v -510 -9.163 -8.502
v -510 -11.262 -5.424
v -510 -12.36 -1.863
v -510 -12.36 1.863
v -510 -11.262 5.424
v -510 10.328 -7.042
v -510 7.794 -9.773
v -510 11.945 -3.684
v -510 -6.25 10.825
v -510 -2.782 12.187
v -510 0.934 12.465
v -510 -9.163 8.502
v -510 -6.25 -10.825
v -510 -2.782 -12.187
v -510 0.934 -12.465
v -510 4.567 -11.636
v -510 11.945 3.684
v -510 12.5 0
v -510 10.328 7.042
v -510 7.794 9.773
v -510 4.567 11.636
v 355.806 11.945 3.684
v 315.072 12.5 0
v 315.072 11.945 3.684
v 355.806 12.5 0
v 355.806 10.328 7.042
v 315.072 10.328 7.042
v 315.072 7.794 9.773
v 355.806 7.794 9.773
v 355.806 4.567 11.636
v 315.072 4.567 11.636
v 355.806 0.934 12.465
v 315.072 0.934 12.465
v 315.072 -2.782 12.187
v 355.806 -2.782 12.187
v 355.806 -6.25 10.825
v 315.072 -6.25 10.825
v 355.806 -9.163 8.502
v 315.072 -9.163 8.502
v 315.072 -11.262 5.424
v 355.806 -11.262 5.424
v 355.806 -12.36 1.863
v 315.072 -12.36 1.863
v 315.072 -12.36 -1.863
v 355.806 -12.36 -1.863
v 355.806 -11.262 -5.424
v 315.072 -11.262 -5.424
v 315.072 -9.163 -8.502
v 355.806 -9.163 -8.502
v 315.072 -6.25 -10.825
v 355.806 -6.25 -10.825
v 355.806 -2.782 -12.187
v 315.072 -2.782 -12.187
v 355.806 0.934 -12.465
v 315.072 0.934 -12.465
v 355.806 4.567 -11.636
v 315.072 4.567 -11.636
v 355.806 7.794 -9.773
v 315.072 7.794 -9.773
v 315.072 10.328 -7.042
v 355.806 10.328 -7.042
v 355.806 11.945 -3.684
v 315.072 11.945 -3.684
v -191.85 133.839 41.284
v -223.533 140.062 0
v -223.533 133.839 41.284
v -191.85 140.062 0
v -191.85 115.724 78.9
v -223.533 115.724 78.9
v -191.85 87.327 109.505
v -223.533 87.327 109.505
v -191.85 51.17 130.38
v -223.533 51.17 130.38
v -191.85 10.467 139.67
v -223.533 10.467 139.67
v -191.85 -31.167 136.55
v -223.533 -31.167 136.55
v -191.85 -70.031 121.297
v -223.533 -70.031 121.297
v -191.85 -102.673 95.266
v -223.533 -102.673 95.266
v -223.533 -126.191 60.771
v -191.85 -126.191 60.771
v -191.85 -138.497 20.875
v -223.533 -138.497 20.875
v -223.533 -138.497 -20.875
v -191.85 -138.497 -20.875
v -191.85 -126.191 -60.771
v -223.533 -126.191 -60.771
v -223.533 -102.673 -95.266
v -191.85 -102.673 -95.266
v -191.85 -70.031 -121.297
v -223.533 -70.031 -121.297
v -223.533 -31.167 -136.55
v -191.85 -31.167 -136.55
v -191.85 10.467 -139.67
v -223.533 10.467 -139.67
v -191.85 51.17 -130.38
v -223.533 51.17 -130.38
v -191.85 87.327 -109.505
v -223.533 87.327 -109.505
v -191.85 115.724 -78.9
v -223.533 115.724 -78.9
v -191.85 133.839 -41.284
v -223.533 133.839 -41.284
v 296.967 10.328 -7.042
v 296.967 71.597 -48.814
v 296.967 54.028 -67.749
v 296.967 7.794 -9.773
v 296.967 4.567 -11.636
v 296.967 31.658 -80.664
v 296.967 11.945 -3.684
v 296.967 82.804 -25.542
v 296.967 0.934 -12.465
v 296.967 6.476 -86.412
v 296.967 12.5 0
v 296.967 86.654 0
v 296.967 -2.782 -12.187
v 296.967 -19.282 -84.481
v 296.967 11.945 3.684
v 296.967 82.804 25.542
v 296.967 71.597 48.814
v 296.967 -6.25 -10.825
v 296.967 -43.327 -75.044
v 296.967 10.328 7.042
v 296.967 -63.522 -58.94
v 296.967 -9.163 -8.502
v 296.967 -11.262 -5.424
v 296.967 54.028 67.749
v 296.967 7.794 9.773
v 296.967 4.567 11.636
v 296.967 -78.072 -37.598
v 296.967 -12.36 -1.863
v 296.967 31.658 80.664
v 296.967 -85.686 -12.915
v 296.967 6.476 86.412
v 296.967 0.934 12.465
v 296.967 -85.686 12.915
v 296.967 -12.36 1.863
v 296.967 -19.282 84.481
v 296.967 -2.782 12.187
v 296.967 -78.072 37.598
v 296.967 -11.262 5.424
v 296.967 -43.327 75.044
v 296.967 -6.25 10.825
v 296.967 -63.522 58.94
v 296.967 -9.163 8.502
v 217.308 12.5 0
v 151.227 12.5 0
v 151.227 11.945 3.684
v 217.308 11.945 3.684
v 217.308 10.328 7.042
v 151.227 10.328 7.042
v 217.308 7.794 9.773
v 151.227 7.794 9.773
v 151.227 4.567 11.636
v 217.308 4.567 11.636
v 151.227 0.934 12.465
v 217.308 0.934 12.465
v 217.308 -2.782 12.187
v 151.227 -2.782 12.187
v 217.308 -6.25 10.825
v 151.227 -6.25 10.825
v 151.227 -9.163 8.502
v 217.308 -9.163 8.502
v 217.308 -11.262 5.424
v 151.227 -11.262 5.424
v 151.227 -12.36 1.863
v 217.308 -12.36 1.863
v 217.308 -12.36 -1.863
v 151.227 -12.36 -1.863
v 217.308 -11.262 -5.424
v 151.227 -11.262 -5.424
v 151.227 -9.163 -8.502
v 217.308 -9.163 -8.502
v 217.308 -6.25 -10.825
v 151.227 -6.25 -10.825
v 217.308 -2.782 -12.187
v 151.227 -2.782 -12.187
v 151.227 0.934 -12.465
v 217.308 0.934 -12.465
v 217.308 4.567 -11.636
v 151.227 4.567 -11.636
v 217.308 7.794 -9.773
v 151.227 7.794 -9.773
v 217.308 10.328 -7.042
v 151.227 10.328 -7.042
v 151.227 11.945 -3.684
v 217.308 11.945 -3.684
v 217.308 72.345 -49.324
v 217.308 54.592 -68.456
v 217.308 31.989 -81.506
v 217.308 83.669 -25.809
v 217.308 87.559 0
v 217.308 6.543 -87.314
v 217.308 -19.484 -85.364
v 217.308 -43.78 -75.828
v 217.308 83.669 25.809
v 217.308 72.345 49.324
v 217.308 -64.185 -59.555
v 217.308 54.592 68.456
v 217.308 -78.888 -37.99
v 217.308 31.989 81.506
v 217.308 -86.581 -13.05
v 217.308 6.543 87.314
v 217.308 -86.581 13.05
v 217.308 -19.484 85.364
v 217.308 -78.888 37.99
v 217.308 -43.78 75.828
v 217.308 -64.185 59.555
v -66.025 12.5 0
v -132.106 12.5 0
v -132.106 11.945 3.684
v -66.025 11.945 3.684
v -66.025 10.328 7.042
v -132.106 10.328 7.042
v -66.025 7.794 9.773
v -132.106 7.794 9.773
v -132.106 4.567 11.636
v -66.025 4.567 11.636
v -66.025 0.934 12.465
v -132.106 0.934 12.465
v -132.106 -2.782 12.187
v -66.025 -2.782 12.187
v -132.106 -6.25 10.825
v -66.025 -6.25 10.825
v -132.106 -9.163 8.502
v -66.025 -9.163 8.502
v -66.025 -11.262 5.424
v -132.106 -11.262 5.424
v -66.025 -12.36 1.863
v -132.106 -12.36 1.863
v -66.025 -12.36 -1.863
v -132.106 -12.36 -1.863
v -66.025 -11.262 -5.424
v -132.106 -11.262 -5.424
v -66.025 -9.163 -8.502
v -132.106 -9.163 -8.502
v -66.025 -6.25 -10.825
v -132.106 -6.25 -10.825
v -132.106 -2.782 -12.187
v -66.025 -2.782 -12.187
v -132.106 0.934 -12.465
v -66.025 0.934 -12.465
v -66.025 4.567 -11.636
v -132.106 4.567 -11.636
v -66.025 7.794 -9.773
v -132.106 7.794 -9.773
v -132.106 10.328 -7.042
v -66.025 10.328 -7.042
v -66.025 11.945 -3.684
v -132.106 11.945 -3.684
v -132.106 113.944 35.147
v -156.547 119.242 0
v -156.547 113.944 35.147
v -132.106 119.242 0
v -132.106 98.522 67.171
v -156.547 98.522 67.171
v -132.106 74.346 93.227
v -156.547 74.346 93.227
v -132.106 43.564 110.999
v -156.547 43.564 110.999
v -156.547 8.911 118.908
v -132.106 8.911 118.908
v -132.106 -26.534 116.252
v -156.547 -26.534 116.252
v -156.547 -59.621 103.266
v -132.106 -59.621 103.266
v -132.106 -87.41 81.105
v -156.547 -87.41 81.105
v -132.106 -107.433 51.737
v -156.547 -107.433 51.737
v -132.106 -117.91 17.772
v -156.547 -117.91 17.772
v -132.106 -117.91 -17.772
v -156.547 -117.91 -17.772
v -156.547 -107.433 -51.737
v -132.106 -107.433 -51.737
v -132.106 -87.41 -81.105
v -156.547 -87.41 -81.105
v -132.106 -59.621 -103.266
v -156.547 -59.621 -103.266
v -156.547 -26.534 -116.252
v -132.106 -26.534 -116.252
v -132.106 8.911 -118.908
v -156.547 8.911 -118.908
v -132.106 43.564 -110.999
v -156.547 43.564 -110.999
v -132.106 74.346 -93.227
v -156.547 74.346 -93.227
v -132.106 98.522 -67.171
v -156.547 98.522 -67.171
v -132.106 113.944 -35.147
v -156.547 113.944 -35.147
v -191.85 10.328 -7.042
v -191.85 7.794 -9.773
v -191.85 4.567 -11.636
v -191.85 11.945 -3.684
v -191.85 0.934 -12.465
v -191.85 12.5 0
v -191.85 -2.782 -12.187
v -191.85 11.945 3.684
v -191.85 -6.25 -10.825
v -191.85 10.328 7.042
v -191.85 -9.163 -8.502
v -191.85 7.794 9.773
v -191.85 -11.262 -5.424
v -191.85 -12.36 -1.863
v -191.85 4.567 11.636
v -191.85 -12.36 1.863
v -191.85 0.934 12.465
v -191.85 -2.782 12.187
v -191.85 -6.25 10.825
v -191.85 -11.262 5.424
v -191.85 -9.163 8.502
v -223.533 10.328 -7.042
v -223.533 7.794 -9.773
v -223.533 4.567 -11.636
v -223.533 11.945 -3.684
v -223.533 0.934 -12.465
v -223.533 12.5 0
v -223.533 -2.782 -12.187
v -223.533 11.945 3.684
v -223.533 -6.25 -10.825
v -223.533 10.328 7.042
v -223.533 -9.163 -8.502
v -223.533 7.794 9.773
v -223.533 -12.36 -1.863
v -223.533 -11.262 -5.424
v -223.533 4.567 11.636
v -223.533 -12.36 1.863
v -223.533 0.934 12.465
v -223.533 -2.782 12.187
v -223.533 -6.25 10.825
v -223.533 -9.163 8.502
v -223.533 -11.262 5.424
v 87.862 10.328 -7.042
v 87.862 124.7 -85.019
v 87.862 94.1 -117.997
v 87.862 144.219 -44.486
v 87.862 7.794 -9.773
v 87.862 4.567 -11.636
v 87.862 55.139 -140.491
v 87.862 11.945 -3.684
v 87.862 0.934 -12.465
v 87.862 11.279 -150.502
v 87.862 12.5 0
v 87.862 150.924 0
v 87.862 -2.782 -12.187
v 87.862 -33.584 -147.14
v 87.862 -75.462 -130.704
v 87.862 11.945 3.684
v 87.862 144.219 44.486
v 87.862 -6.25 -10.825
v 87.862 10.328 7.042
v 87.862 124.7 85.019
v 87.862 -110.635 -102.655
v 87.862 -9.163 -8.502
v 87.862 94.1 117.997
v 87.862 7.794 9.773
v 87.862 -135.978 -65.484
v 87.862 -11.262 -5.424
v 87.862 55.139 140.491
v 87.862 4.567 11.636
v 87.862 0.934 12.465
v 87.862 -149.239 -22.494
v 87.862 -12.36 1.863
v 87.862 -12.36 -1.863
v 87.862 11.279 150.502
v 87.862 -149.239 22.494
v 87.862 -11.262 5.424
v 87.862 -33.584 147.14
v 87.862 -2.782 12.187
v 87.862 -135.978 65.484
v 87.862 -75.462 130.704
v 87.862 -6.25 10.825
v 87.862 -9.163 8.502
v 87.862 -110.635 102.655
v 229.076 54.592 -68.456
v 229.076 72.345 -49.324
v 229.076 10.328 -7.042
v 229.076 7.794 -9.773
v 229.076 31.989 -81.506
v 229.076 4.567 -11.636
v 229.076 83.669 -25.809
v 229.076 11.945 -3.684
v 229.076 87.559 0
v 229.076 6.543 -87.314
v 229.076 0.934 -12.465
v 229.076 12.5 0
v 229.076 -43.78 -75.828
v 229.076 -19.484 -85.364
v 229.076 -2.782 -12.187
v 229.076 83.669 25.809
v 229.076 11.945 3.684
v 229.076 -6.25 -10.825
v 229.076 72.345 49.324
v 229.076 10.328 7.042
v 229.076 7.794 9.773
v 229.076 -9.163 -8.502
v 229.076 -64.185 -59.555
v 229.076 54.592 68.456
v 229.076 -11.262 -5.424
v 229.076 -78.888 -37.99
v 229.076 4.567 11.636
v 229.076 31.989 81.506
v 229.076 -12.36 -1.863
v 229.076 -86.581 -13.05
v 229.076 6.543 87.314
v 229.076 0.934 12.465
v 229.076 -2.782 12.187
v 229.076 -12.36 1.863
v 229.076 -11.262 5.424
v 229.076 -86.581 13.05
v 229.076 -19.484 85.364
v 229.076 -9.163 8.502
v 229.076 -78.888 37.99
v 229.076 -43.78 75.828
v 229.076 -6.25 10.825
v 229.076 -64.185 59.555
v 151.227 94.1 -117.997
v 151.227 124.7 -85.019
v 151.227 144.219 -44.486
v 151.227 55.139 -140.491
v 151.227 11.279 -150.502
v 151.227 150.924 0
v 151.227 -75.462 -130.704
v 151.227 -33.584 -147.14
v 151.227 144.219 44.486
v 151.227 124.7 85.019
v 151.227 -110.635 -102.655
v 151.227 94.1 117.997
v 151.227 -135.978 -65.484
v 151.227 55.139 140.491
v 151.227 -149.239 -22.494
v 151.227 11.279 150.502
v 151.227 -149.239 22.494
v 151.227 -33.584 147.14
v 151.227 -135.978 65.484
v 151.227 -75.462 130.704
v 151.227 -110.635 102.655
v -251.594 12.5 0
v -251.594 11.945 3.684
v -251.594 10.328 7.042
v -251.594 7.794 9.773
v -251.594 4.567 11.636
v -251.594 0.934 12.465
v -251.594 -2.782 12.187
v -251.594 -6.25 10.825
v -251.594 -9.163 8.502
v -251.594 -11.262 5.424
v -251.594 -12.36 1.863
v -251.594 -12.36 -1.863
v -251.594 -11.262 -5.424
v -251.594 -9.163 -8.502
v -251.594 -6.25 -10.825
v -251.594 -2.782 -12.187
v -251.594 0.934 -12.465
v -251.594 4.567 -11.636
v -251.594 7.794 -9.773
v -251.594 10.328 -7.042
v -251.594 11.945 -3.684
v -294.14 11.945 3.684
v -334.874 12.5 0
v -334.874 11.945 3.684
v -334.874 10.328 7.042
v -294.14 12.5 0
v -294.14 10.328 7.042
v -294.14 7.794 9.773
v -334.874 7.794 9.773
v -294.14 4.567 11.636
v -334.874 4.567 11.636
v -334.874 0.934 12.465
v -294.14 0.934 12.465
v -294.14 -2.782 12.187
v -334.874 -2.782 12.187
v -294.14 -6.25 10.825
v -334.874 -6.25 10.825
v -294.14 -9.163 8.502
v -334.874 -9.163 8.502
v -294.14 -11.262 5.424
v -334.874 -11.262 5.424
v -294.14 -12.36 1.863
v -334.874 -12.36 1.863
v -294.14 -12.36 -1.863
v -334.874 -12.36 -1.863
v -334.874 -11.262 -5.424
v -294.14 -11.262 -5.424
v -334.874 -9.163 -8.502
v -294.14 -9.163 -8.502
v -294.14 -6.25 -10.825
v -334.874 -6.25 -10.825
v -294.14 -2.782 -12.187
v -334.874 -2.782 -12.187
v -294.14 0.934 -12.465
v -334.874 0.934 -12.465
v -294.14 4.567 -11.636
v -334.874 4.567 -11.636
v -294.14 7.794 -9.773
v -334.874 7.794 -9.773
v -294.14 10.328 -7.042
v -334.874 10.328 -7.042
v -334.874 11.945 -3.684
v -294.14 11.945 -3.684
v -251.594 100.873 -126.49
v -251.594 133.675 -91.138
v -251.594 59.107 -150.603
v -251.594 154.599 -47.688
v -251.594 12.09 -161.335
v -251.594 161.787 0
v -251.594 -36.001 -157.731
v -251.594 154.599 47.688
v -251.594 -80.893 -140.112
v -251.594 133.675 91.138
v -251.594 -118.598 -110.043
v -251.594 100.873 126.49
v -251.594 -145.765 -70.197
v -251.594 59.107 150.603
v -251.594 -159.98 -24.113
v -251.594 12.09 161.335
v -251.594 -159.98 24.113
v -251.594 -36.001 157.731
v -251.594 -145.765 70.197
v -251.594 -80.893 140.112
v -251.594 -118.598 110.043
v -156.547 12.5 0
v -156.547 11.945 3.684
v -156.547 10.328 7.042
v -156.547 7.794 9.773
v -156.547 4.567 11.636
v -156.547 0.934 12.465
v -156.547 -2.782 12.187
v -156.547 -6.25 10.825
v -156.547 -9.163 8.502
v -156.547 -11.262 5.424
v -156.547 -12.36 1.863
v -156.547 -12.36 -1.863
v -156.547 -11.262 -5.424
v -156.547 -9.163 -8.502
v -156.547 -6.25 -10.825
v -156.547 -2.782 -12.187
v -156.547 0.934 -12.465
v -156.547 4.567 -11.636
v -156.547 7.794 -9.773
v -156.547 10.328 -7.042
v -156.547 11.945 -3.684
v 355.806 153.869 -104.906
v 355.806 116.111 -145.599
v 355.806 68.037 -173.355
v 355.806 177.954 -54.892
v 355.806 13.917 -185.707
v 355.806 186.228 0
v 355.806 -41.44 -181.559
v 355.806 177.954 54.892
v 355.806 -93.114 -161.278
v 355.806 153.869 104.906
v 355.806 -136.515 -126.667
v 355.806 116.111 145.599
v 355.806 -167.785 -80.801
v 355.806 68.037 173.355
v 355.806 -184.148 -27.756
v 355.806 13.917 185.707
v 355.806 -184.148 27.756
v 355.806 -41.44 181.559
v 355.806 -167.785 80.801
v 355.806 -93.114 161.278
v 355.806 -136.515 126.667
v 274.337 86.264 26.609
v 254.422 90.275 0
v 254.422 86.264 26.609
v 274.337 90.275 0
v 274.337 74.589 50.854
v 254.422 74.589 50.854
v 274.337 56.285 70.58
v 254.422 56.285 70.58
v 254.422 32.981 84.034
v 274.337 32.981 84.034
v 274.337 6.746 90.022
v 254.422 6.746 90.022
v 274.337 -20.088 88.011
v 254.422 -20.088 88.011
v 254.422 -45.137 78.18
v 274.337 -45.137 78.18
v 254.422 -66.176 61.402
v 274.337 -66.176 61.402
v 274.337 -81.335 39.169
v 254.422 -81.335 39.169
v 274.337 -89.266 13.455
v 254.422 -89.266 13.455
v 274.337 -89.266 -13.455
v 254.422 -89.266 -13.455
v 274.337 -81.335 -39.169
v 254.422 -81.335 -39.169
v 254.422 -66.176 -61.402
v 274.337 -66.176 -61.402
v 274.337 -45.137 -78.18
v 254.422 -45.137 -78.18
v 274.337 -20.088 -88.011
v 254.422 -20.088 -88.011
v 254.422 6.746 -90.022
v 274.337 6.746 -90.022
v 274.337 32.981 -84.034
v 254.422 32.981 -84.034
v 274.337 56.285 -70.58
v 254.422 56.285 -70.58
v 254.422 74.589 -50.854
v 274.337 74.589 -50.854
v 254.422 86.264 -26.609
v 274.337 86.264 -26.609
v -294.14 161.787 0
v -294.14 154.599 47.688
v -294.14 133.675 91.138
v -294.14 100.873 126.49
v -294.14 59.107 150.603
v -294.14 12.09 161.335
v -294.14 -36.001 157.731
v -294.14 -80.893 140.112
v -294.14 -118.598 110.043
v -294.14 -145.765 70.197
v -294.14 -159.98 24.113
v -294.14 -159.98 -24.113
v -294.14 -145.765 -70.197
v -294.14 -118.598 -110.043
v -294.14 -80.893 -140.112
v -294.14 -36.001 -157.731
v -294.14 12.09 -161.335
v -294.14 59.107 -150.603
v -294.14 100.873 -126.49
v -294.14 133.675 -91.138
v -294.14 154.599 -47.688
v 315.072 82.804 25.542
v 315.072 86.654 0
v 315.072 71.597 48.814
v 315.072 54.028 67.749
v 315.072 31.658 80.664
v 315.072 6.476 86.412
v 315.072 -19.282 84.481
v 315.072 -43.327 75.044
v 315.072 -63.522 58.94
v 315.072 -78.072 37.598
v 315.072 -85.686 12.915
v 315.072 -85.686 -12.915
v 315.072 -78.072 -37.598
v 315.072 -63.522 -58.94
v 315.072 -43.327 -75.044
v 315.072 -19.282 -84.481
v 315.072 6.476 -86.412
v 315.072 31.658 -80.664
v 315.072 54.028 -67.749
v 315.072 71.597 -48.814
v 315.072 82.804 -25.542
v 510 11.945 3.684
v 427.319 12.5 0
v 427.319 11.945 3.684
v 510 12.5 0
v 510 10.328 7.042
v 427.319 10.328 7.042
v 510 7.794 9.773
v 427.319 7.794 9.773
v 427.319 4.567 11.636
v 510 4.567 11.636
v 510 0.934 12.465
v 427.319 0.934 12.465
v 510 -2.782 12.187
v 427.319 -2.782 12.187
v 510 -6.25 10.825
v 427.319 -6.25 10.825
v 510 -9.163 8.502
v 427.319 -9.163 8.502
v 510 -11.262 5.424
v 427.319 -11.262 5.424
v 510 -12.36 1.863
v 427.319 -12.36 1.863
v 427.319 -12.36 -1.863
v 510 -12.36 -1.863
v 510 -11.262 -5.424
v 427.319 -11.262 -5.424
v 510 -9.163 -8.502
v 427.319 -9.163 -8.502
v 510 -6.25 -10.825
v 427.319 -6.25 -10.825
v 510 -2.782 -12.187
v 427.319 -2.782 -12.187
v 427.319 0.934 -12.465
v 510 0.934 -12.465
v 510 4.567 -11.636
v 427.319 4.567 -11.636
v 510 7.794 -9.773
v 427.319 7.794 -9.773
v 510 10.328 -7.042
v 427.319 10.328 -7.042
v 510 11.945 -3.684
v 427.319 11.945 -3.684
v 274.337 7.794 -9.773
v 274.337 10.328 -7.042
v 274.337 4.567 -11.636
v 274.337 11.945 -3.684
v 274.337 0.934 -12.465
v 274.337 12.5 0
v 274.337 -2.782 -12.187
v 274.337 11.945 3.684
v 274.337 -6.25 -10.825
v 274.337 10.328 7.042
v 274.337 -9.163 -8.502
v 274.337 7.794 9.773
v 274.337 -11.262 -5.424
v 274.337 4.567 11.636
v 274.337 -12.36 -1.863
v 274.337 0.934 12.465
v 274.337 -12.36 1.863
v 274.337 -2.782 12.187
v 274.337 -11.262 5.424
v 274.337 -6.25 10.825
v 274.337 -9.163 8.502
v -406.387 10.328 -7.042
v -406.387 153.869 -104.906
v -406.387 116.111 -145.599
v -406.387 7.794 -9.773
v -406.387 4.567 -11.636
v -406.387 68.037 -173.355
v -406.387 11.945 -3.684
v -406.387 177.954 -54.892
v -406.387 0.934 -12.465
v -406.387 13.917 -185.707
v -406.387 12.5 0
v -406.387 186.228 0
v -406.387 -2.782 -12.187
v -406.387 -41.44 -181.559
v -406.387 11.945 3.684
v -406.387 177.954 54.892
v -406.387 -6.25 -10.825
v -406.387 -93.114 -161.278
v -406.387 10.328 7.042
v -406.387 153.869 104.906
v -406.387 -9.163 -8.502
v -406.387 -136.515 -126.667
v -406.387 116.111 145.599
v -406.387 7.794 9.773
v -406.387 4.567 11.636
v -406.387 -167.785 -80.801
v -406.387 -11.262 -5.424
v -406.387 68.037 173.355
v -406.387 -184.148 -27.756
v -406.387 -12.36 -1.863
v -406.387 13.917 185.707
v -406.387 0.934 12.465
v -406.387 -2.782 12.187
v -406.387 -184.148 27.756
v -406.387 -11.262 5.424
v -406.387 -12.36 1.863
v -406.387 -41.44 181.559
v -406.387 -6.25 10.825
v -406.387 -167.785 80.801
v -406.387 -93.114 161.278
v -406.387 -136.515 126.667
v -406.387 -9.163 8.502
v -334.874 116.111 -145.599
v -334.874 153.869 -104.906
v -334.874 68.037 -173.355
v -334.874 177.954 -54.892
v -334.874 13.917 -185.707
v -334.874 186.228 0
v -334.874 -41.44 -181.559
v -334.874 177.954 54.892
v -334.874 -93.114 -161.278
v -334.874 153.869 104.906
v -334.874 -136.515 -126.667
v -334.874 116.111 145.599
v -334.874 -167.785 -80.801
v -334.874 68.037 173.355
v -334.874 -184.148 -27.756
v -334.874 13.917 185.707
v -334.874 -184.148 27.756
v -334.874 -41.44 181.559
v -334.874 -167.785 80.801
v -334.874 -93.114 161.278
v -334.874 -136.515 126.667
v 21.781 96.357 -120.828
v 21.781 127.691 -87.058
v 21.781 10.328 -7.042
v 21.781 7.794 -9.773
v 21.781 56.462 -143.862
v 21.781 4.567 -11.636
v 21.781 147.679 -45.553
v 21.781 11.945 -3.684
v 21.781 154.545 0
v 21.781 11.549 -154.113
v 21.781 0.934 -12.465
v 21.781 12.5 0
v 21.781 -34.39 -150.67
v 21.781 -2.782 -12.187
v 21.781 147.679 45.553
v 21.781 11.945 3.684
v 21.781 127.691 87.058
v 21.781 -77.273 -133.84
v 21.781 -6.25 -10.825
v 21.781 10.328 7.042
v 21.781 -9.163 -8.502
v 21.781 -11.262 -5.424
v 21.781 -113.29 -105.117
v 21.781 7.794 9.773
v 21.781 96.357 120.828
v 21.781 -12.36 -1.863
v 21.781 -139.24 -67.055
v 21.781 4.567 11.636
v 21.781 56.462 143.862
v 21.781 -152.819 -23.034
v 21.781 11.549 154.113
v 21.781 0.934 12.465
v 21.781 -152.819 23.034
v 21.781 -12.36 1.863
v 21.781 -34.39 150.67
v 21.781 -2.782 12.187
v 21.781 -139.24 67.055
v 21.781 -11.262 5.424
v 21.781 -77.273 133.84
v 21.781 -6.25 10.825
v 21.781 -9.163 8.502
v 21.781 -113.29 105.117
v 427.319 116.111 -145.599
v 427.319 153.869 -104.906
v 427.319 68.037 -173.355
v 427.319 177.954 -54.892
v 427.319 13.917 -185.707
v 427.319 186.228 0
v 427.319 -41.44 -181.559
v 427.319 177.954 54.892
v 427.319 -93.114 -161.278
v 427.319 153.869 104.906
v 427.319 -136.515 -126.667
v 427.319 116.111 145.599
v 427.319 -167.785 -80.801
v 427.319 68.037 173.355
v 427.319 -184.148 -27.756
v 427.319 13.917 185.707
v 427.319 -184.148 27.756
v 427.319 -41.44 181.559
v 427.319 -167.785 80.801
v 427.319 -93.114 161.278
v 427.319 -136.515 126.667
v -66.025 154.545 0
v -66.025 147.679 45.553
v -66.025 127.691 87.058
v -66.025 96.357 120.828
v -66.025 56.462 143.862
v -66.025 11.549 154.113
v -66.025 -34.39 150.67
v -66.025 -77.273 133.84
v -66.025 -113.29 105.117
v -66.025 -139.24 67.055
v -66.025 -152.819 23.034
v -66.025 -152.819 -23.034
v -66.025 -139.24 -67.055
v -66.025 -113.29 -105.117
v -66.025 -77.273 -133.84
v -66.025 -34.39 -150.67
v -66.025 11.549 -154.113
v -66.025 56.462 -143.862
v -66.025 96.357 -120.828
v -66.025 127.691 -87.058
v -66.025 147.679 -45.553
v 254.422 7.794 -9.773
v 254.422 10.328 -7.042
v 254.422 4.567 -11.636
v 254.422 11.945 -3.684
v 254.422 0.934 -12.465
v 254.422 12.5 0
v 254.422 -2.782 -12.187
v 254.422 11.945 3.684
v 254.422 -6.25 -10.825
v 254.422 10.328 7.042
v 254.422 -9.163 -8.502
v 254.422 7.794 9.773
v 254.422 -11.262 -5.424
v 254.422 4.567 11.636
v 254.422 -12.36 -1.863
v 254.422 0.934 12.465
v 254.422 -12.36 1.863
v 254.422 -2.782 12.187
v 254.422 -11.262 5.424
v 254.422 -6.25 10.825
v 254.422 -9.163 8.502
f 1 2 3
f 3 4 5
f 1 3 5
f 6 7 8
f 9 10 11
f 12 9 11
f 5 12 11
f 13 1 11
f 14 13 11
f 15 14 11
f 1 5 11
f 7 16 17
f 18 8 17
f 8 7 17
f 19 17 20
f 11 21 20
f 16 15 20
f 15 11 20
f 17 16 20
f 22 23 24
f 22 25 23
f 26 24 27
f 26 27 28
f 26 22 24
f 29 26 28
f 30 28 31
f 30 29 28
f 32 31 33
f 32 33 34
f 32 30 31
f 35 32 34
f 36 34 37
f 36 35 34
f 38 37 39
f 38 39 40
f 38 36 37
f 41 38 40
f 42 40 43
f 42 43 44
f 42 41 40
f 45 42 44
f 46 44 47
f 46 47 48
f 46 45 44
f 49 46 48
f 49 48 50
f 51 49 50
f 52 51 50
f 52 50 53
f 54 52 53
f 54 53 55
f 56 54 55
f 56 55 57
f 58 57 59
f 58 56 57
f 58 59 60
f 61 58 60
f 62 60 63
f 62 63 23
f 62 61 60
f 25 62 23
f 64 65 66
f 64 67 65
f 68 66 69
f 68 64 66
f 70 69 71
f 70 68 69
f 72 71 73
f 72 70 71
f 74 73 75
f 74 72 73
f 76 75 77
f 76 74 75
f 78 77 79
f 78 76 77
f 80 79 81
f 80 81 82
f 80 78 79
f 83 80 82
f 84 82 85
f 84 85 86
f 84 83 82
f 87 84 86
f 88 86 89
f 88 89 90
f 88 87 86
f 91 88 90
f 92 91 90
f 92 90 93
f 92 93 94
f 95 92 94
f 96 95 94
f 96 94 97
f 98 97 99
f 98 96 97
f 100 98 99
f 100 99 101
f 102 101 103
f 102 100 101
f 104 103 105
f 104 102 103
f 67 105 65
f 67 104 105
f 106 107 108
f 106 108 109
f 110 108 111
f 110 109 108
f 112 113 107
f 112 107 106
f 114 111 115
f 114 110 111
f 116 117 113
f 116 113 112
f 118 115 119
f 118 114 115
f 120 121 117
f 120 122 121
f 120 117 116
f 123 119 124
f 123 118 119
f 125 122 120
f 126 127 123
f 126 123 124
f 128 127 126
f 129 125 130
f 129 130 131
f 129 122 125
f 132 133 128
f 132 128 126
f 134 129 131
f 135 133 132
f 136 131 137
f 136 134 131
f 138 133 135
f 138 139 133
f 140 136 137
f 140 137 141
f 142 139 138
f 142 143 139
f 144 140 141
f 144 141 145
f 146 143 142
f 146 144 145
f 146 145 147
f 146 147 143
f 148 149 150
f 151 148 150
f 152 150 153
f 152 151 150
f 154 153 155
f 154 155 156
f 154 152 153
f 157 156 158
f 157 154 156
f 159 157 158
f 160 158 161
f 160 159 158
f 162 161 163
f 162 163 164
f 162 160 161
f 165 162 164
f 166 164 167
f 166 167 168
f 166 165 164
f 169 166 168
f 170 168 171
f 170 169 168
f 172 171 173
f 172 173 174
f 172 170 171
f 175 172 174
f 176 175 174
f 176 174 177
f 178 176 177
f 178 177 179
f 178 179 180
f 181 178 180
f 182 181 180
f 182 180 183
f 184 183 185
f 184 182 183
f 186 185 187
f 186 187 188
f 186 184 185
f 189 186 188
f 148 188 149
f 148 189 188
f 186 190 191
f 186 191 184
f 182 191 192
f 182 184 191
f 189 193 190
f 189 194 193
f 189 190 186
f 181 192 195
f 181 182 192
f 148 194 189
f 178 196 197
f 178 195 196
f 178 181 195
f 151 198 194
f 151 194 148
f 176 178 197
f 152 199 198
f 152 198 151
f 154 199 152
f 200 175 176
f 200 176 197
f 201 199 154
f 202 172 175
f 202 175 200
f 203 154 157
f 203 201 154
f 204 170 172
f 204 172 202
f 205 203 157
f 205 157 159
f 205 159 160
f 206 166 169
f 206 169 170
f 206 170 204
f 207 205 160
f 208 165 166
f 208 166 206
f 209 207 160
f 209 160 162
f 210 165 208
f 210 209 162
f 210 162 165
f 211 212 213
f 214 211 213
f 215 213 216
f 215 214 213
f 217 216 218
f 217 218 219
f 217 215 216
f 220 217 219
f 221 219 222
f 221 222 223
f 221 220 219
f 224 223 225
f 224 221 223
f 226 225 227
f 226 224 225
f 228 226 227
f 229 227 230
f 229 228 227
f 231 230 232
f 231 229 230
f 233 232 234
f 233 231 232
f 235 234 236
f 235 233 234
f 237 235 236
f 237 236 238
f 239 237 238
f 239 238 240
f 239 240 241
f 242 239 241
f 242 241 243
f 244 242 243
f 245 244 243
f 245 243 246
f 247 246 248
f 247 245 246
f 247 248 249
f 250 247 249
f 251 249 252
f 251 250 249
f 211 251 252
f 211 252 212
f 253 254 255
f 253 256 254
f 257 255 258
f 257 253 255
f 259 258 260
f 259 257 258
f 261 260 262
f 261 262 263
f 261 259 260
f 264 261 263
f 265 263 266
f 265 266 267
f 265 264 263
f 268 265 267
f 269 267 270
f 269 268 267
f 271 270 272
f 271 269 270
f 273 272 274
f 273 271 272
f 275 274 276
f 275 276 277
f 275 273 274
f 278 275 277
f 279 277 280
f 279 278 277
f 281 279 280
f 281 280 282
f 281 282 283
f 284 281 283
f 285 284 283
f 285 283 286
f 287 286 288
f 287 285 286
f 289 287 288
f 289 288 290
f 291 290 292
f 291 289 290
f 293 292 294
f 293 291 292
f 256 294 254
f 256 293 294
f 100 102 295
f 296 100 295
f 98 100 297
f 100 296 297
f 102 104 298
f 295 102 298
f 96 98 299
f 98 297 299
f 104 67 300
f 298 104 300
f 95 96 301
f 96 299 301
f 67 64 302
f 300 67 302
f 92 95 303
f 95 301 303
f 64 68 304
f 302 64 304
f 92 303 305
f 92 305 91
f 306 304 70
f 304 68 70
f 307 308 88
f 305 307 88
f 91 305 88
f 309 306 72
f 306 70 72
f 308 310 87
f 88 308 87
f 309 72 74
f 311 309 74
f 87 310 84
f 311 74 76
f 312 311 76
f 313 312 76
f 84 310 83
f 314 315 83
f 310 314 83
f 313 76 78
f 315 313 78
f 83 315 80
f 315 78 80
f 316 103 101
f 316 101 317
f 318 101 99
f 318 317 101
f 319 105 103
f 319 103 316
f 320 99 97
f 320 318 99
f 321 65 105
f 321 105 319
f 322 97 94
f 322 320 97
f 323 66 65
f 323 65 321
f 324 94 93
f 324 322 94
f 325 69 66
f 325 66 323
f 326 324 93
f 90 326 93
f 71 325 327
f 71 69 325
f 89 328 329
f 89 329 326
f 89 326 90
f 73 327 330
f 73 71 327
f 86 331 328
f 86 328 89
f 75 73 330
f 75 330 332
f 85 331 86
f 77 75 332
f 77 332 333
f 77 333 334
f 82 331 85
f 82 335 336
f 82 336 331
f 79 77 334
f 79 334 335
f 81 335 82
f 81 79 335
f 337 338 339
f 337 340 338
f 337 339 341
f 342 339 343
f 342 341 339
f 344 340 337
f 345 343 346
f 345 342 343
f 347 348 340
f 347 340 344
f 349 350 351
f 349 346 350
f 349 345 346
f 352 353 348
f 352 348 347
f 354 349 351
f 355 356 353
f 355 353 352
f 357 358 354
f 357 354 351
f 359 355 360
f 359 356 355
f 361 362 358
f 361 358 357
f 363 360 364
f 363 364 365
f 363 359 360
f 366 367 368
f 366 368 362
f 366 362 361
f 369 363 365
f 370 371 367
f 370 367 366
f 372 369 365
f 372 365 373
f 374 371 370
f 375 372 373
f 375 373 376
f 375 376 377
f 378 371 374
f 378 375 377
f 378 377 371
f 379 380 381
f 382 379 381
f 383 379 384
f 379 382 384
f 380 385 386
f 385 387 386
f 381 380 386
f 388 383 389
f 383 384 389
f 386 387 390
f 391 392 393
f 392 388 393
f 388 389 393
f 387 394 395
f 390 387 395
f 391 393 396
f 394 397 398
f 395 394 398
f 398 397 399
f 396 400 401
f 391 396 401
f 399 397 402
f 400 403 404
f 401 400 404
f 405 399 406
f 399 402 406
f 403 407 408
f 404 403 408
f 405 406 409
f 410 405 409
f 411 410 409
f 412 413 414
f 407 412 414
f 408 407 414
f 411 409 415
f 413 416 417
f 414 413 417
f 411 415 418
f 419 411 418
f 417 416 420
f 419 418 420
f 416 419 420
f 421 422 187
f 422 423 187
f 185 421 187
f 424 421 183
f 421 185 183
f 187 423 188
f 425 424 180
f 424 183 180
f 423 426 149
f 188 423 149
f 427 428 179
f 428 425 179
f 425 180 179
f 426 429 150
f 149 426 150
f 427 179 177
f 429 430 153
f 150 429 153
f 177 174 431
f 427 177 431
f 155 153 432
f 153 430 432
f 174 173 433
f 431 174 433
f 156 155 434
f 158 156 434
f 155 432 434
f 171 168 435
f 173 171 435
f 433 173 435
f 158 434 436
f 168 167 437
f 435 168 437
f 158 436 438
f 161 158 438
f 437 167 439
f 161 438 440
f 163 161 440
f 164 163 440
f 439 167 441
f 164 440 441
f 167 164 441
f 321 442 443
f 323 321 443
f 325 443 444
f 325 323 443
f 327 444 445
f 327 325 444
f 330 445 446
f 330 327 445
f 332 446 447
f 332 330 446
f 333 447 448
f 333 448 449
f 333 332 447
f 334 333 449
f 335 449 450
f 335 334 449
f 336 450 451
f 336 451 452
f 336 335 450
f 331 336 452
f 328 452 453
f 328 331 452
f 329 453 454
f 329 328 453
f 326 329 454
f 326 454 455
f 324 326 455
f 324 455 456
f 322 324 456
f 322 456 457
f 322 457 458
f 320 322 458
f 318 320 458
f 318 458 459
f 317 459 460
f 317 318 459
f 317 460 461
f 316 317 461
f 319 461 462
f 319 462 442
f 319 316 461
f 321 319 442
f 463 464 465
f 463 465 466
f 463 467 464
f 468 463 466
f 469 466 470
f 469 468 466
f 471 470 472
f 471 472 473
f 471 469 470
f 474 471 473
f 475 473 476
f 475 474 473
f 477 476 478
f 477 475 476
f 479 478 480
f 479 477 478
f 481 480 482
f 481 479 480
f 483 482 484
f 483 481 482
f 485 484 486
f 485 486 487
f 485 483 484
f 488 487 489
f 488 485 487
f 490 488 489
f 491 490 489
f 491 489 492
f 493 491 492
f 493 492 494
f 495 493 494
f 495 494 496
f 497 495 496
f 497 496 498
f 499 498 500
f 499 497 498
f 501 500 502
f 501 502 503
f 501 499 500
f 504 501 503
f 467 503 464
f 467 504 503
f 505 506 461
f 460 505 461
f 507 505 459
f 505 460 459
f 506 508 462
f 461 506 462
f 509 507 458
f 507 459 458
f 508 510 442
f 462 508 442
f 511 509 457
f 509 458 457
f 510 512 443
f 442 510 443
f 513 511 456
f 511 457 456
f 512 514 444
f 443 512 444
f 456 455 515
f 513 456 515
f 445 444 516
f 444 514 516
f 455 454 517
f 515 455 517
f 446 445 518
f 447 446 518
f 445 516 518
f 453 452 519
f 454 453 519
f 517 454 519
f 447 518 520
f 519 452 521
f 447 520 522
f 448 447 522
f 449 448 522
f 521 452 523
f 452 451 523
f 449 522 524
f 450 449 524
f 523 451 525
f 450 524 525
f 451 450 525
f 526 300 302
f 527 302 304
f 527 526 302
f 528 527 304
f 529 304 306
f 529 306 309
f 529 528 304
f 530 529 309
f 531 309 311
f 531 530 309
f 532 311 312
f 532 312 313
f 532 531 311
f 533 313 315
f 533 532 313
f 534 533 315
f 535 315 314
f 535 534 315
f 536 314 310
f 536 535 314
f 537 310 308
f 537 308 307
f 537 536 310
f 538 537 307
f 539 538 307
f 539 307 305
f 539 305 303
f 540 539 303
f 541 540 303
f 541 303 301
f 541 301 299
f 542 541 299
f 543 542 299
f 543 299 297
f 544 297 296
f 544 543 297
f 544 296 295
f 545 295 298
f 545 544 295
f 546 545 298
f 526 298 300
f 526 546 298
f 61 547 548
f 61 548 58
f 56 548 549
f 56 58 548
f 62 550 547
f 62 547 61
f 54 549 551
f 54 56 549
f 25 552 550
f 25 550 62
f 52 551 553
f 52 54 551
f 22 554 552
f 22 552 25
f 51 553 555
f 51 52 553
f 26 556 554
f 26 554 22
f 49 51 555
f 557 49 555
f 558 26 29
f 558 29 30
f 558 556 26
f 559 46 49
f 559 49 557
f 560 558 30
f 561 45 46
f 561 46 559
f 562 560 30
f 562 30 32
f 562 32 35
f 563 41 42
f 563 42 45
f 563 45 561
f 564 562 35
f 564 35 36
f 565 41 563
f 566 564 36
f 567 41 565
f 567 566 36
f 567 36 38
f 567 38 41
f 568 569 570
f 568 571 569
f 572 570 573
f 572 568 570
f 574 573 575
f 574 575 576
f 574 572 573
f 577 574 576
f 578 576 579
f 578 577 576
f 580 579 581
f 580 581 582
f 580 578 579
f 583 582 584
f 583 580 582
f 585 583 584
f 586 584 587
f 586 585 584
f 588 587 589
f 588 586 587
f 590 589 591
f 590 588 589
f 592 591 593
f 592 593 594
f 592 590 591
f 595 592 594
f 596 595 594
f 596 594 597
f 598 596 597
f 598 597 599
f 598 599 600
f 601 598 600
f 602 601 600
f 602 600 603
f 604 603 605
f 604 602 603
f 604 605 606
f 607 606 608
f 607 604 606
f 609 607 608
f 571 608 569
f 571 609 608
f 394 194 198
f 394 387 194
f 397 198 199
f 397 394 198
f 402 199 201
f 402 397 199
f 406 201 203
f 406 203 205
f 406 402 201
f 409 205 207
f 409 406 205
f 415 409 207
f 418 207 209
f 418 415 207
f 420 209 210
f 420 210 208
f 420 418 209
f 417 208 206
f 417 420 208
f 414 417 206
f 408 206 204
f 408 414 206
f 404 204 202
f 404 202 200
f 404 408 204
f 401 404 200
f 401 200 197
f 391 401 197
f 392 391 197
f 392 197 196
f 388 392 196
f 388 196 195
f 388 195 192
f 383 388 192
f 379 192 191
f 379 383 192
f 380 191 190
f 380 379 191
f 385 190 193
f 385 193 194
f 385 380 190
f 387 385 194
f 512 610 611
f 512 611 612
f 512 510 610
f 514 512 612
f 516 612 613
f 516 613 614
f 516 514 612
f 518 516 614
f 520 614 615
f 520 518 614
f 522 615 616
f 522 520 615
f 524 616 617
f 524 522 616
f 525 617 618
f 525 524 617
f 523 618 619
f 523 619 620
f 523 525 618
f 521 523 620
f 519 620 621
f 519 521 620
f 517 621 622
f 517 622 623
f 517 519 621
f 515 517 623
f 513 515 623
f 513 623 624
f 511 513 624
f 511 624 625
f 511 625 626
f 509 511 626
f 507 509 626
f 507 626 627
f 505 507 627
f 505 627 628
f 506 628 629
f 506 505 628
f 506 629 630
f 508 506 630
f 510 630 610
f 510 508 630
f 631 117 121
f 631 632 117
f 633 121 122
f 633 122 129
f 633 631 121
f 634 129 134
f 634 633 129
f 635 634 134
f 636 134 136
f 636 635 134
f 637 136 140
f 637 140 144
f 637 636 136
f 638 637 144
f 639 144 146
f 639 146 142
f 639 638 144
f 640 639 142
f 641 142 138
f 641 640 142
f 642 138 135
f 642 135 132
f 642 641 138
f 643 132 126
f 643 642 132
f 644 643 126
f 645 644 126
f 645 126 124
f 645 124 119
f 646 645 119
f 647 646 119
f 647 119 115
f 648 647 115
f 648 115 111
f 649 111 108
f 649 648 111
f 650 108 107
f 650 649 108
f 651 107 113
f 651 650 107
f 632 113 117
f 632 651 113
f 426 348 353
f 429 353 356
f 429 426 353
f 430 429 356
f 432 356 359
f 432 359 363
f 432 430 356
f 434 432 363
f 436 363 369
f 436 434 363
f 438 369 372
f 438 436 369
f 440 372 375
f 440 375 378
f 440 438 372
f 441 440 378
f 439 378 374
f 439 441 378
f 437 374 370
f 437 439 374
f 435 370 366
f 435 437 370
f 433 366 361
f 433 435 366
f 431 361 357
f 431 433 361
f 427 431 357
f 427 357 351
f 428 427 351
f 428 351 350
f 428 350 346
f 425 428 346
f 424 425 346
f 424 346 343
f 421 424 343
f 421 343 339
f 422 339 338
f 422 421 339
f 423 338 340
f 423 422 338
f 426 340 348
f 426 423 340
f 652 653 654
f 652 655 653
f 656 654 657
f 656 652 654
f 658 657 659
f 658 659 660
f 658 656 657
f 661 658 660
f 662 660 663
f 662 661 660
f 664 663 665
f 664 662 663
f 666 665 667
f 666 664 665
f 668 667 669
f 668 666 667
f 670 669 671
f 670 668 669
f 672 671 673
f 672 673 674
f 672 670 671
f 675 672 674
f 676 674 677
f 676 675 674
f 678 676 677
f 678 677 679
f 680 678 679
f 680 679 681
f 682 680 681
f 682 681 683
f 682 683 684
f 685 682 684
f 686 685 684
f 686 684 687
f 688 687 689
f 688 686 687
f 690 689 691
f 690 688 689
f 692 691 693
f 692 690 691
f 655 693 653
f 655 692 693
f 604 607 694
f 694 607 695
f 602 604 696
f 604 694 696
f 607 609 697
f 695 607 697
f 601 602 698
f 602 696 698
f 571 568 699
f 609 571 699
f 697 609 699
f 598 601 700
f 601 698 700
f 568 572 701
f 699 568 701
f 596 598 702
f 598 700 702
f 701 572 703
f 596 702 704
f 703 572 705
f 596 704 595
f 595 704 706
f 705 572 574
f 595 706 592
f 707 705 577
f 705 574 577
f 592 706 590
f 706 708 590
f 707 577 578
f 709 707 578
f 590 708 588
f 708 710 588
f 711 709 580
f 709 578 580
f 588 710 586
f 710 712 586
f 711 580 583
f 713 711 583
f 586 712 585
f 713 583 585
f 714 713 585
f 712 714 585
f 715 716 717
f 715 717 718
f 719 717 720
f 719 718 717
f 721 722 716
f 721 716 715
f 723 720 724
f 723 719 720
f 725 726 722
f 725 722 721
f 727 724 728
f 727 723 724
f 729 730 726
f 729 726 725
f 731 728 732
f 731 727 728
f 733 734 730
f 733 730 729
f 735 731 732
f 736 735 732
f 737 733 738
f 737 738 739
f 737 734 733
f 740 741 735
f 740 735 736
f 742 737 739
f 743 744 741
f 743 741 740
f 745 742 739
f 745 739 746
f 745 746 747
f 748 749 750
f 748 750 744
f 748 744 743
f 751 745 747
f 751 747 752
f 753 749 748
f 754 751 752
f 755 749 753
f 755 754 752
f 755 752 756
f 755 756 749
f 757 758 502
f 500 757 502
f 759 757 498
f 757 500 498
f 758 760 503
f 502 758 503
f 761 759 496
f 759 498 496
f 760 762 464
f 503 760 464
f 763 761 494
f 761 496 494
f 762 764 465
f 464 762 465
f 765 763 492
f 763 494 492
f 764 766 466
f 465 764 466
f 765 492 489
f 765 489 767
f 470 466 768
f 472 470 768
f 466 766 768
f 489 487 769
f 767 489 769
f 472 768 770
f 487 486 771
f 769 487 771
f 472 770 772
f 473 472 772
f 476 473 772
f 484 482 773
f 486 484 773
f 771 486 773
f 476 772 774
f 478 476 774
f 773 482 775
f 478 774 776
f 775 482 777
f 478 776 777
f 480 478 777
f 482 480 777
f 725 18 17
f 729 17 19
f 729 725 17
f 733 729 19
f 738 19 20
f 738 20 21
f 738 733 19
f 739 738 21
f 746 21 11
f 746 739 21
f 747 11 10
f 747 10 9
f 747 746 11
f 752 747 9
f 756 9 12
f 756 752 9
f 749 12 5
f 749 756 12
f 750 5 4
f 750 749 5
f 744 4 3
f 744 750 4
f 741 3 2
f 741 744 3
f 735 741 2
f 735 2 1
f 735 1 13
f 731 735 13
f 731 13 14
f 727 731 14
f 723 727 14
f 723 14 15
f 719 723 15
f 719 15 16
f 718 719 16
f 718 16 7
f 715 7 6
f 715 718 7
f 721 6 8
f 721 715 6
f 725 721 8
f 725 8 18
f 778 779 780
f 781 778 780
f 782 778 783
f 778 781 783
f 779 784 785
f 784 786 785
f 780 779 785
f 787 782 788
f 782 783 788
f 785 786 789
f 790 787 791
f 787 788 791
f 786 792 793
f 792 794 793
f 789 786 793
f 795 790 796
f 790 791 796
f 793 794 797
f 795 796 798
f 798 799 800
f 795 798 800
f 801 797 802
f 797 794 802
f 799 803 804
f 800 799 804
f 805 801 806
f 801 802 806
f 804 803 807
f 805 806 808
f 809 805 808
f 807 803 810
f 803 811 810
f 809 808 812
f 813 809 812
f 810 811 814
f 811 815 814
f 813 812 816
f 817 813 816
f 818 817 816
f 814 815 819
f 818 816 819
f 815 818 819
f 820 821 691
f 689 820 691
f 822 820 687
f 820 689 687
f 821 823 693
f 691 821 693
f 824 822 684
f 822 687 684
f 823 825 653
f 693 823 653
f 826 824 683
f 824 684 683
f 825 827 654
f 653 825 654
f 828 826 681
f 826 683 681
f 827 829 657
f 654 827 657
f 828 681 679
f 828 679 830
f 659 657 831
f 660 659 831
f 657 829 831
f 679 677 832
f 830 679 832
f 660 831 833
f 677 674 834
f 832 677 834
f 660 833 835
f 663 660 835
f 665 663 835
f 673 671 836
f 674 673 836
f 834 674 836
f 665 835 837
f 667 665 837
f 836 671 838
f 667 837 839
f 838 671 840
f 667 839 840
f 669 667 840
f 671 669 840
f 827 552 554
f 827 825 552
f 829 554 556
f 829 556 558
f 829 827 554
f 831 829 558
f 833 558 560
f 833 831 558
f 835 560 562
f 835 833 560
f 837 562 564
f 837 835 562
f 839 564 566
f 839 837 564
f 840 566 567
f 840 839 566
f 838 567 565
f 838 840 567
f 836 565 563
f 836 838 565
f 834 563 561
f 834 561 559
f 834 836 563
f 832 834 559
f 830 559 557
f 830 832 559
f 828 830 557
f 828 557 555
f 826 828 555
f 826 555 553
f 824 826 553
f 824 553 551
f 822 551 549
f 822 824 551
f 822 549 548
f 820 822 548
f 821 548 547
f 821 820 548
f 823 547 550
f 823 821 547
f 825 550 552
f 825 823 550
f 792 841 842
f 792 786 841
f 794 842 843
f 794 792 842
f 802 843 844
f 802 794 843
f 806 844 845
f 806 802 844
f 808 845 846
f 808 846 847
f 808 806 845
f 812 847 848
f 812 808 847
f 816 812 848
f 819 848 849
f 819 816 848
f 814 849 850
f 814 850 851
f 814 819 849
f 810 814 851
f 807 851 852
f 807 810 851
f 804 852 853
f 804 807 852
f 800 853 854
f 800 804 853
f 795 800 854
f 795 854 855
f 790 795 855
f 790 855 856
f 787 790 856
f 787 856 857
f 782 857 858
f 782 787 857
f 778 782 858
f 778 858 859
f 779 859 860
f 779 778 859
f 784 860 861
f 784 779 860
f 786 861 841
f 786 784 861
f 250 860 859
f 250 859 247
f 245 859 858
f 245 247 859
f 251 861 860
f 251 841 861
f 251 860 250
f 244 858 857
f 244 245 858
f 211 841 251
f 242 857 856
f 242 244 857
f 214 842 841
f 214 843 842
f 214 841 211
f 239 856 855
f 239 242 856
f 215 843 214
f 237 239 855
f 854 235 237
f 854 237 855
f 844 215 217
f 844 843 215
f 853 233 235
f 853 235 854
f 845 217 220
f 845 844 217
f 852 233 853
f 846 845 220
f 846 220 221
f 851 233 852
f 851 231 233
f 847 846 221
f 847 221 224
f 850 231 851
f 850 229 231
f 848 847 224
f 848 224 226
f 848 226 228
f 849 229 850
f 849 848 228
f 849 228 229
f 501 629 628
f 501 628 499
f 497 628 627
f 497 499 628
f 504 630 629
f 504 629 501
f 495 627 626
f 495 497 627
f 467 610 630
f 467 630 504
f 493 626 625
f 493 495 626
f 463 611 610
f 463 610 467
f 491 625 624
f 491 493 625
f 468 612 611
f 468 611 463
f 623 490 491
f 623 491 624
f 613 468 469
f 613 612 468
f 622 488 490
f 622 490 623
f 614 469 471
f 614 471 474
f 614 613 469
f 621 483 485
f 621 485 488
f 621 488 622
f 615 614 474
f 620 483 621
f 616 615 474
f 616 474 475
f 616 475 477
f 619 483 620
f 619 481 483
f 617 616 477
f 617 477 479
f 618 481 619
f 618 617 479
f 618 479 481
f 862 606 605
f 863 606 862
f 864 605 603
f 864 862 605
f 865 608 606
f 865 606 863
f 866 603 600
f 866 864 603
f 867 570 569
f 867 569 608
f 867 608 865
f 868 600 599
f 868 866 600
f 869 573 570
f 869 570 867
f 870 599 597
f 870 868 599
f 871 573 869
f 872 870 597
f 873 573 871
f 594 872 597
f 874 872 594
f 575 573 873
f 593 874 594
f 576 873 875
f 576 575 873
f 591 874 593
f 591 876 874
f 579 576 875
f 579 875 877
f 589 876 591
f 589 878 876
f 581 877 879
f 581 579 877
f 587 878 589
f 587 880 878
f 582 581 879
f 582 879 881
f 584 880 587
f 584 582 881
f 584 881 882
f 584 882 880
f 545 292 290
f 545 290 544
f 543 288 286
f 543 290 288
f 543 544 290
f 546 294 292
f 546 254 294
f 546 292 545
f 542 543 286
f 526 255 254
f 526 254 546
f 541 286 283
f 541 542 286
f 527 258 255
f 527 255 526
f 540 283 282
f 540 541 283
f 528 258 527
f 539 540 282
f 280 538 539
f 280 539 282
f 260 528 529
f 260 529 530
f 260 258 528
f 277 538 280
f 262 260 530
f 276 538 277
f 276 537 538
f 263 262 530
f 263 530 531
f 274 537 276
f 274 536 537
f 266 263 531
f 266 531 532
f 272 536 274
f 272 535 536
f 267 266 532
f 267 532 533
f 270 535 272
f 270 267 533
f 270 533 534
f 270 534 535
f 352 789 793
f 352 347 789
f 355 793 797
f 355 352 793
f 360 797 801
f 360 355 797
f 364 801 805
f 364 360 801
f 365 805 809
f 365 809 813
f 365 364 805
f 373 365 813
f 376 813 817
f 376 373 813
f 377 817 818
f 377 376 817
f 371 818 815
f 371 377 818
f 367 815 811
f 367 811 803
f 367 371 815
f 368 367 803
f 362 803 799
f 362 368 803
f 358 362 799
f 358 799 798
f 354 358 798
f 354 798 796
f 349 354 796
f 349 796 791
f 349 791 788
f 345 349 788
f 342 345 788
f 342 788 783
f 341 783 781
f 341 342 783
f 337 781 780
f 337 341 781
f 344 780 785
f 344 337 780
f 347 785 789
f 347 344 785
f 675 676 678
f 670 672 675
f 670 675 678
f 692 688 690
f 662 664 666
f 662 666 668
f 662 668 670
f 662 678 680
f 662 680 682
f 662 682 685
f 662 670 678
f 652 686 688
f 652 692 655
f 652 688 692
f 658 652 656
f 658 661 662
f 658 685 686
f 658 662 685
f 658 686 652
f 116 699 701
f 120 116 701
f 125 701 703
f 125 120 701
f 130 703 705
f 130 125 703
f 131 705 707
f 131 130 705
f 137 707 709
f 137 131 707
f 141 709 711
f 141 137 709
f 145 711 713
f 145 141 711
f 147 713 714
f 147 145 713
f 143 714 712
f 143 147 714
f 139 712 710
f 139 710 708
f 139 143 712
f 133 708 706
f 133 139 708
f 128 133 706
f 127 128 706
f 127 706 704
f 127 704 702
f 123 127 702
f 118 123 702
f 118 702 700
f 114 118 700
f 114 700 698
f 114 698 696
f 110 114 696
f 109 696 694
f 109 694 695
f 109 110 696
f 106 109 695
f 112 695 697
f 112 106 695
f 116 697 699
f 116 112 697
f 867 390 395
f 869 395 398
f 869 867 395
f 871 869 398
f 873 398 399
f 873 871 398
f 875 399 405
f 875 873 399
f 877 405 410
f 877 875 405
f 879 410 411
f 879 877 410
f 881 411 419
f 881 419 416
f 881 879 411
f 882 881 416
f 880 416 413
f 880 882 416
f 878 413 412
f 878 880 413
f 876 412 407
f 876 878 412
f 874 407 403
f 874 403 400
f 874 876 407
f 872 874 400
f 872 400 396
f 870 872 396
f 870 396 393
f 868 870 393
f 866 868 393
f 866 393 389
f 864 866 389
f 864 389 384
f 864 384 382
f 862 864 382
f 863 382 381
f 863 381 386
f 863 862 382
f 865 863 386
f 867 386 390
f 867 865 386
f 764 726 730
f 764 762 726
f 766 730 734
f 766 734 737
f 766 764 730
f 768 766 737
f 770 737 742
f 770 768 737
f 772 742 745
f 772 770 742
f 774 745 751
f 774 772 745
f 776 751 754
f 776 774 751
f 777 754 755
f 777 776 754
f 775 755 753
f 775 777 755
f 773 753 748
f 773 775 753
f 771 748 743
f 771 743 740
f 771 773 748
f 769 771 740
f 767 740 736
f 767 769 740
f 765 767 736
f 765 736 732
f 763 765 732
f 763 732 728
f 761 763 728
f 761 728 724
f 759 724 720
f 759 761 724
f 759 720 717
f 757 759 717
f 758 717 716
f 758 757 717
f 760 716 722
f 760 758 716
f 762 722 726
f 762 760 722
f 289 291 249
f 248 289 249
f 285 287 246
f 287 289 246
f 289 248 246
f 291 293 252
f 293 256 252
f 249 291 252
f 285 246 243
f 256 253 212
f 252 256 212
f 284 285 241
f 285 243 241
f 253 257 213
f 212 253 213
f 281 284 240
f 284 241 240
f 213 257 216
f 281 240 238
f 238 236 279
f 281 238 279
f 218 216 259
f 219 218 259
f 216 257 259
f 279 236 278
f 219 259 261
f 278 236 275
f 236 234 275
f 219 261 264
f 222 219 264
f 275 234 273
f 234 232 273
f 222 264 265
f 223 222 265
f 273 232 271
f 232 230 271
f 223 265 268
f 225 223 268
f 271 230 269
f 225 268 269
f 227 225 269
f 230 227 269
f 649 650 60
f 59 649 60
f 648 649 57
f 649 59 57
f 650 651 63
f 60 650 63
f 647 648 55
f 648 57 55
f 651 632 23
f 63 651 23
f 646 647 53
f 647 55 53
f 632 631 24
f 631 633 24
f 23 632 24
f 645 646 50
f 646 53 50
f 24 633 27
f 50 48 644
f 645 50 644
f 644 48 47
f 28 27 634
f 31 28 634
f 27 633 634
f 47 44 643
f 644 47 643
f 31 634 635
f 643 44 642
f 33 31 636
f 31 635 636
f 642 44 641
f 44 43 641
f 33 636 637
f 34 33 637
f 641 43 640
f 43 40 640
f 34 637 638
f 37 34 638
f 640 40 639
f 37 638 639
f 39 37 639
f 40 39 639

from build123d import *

# Parameters (mm, degrees)
F0_R     = 12.5
F1_DEPTH = 510
F2_W     = 71.5121626854
F2_H     = 186.2277984619
F2_W_2   = 42.5452291965
F2_H_2   = 161.7869436741
F2_W_3   = 31.6825956106
F2_H_3   = 140.0617212057
F2_W_4   = 24.440869689
F2_H_4   = 119.2417219281
F2_W_5   = 87.8060813993
F2_H_5   = 154.5452028513
F2_W_6   = 63.3652210236
F2_H_6   = 150.9243249893
F2_W_7   = 11.7678269744
F2_H_7   = 87.5591114163
F2_W_8   = 19.9147760868
F2_H_8   = 90.2747660875
F2_W_9   = 18.1043446064
F2_H_9   = 86.6538956761


with BuildPart() as f1:
    # F0 (on Right) → F1 (new body, symmetric)
    with BuildSketch(Plane.YZ):
        Circle(F0_R)
    extrude(amount=F1_DEPTH, both=True)

    # F2 (on Top) → F3 (revolve)
    with BuildSketch(Plane.XY):
        with Locations((391.5624916553, 93.113899231)):
            Rectangle(F2_W, F2_H)
        with Locations((-370.6304728985, 93.113899231)):
            Rectangle(F2_W, F2_H)
        with Locations((-272.8670090437, 80.893471837)):
            Rectangle(F2_W_2, F2_H_2)
        with Locations((-207.6913639903, 70.0308606029)):
            Rectangle(F2_W_3, F2_H_3)
        with Locations((-144.3261578679, 59.6208609641)):
            Rectangle(F2_W_4, F2_H_4)
        with Locations((-22.121806629, 77.2726014256)):
            Rectangle(F2_W_5, F2_H_5)
        with Locations((119.5446997881, 75.4621624947)):
            Rectangle(F2_W_6, F2_H_6)
        with Locations((223.1920994818, 43.7795557082)):
            Rectangle(F2_W_7, F2_H_7)
        with Locations((264.3794864416, 45.1373830438)):
            Rectangle(F2_W_8, F2_H_8)
        with Locations((306.0194700956, 43.3269478381)):
            Rectangle(F2_W_9, F2_H_9)
    revolve(axis=Axis((10.4660093784, 0, 0), (1, 0, 0)))


solid = f1.part
